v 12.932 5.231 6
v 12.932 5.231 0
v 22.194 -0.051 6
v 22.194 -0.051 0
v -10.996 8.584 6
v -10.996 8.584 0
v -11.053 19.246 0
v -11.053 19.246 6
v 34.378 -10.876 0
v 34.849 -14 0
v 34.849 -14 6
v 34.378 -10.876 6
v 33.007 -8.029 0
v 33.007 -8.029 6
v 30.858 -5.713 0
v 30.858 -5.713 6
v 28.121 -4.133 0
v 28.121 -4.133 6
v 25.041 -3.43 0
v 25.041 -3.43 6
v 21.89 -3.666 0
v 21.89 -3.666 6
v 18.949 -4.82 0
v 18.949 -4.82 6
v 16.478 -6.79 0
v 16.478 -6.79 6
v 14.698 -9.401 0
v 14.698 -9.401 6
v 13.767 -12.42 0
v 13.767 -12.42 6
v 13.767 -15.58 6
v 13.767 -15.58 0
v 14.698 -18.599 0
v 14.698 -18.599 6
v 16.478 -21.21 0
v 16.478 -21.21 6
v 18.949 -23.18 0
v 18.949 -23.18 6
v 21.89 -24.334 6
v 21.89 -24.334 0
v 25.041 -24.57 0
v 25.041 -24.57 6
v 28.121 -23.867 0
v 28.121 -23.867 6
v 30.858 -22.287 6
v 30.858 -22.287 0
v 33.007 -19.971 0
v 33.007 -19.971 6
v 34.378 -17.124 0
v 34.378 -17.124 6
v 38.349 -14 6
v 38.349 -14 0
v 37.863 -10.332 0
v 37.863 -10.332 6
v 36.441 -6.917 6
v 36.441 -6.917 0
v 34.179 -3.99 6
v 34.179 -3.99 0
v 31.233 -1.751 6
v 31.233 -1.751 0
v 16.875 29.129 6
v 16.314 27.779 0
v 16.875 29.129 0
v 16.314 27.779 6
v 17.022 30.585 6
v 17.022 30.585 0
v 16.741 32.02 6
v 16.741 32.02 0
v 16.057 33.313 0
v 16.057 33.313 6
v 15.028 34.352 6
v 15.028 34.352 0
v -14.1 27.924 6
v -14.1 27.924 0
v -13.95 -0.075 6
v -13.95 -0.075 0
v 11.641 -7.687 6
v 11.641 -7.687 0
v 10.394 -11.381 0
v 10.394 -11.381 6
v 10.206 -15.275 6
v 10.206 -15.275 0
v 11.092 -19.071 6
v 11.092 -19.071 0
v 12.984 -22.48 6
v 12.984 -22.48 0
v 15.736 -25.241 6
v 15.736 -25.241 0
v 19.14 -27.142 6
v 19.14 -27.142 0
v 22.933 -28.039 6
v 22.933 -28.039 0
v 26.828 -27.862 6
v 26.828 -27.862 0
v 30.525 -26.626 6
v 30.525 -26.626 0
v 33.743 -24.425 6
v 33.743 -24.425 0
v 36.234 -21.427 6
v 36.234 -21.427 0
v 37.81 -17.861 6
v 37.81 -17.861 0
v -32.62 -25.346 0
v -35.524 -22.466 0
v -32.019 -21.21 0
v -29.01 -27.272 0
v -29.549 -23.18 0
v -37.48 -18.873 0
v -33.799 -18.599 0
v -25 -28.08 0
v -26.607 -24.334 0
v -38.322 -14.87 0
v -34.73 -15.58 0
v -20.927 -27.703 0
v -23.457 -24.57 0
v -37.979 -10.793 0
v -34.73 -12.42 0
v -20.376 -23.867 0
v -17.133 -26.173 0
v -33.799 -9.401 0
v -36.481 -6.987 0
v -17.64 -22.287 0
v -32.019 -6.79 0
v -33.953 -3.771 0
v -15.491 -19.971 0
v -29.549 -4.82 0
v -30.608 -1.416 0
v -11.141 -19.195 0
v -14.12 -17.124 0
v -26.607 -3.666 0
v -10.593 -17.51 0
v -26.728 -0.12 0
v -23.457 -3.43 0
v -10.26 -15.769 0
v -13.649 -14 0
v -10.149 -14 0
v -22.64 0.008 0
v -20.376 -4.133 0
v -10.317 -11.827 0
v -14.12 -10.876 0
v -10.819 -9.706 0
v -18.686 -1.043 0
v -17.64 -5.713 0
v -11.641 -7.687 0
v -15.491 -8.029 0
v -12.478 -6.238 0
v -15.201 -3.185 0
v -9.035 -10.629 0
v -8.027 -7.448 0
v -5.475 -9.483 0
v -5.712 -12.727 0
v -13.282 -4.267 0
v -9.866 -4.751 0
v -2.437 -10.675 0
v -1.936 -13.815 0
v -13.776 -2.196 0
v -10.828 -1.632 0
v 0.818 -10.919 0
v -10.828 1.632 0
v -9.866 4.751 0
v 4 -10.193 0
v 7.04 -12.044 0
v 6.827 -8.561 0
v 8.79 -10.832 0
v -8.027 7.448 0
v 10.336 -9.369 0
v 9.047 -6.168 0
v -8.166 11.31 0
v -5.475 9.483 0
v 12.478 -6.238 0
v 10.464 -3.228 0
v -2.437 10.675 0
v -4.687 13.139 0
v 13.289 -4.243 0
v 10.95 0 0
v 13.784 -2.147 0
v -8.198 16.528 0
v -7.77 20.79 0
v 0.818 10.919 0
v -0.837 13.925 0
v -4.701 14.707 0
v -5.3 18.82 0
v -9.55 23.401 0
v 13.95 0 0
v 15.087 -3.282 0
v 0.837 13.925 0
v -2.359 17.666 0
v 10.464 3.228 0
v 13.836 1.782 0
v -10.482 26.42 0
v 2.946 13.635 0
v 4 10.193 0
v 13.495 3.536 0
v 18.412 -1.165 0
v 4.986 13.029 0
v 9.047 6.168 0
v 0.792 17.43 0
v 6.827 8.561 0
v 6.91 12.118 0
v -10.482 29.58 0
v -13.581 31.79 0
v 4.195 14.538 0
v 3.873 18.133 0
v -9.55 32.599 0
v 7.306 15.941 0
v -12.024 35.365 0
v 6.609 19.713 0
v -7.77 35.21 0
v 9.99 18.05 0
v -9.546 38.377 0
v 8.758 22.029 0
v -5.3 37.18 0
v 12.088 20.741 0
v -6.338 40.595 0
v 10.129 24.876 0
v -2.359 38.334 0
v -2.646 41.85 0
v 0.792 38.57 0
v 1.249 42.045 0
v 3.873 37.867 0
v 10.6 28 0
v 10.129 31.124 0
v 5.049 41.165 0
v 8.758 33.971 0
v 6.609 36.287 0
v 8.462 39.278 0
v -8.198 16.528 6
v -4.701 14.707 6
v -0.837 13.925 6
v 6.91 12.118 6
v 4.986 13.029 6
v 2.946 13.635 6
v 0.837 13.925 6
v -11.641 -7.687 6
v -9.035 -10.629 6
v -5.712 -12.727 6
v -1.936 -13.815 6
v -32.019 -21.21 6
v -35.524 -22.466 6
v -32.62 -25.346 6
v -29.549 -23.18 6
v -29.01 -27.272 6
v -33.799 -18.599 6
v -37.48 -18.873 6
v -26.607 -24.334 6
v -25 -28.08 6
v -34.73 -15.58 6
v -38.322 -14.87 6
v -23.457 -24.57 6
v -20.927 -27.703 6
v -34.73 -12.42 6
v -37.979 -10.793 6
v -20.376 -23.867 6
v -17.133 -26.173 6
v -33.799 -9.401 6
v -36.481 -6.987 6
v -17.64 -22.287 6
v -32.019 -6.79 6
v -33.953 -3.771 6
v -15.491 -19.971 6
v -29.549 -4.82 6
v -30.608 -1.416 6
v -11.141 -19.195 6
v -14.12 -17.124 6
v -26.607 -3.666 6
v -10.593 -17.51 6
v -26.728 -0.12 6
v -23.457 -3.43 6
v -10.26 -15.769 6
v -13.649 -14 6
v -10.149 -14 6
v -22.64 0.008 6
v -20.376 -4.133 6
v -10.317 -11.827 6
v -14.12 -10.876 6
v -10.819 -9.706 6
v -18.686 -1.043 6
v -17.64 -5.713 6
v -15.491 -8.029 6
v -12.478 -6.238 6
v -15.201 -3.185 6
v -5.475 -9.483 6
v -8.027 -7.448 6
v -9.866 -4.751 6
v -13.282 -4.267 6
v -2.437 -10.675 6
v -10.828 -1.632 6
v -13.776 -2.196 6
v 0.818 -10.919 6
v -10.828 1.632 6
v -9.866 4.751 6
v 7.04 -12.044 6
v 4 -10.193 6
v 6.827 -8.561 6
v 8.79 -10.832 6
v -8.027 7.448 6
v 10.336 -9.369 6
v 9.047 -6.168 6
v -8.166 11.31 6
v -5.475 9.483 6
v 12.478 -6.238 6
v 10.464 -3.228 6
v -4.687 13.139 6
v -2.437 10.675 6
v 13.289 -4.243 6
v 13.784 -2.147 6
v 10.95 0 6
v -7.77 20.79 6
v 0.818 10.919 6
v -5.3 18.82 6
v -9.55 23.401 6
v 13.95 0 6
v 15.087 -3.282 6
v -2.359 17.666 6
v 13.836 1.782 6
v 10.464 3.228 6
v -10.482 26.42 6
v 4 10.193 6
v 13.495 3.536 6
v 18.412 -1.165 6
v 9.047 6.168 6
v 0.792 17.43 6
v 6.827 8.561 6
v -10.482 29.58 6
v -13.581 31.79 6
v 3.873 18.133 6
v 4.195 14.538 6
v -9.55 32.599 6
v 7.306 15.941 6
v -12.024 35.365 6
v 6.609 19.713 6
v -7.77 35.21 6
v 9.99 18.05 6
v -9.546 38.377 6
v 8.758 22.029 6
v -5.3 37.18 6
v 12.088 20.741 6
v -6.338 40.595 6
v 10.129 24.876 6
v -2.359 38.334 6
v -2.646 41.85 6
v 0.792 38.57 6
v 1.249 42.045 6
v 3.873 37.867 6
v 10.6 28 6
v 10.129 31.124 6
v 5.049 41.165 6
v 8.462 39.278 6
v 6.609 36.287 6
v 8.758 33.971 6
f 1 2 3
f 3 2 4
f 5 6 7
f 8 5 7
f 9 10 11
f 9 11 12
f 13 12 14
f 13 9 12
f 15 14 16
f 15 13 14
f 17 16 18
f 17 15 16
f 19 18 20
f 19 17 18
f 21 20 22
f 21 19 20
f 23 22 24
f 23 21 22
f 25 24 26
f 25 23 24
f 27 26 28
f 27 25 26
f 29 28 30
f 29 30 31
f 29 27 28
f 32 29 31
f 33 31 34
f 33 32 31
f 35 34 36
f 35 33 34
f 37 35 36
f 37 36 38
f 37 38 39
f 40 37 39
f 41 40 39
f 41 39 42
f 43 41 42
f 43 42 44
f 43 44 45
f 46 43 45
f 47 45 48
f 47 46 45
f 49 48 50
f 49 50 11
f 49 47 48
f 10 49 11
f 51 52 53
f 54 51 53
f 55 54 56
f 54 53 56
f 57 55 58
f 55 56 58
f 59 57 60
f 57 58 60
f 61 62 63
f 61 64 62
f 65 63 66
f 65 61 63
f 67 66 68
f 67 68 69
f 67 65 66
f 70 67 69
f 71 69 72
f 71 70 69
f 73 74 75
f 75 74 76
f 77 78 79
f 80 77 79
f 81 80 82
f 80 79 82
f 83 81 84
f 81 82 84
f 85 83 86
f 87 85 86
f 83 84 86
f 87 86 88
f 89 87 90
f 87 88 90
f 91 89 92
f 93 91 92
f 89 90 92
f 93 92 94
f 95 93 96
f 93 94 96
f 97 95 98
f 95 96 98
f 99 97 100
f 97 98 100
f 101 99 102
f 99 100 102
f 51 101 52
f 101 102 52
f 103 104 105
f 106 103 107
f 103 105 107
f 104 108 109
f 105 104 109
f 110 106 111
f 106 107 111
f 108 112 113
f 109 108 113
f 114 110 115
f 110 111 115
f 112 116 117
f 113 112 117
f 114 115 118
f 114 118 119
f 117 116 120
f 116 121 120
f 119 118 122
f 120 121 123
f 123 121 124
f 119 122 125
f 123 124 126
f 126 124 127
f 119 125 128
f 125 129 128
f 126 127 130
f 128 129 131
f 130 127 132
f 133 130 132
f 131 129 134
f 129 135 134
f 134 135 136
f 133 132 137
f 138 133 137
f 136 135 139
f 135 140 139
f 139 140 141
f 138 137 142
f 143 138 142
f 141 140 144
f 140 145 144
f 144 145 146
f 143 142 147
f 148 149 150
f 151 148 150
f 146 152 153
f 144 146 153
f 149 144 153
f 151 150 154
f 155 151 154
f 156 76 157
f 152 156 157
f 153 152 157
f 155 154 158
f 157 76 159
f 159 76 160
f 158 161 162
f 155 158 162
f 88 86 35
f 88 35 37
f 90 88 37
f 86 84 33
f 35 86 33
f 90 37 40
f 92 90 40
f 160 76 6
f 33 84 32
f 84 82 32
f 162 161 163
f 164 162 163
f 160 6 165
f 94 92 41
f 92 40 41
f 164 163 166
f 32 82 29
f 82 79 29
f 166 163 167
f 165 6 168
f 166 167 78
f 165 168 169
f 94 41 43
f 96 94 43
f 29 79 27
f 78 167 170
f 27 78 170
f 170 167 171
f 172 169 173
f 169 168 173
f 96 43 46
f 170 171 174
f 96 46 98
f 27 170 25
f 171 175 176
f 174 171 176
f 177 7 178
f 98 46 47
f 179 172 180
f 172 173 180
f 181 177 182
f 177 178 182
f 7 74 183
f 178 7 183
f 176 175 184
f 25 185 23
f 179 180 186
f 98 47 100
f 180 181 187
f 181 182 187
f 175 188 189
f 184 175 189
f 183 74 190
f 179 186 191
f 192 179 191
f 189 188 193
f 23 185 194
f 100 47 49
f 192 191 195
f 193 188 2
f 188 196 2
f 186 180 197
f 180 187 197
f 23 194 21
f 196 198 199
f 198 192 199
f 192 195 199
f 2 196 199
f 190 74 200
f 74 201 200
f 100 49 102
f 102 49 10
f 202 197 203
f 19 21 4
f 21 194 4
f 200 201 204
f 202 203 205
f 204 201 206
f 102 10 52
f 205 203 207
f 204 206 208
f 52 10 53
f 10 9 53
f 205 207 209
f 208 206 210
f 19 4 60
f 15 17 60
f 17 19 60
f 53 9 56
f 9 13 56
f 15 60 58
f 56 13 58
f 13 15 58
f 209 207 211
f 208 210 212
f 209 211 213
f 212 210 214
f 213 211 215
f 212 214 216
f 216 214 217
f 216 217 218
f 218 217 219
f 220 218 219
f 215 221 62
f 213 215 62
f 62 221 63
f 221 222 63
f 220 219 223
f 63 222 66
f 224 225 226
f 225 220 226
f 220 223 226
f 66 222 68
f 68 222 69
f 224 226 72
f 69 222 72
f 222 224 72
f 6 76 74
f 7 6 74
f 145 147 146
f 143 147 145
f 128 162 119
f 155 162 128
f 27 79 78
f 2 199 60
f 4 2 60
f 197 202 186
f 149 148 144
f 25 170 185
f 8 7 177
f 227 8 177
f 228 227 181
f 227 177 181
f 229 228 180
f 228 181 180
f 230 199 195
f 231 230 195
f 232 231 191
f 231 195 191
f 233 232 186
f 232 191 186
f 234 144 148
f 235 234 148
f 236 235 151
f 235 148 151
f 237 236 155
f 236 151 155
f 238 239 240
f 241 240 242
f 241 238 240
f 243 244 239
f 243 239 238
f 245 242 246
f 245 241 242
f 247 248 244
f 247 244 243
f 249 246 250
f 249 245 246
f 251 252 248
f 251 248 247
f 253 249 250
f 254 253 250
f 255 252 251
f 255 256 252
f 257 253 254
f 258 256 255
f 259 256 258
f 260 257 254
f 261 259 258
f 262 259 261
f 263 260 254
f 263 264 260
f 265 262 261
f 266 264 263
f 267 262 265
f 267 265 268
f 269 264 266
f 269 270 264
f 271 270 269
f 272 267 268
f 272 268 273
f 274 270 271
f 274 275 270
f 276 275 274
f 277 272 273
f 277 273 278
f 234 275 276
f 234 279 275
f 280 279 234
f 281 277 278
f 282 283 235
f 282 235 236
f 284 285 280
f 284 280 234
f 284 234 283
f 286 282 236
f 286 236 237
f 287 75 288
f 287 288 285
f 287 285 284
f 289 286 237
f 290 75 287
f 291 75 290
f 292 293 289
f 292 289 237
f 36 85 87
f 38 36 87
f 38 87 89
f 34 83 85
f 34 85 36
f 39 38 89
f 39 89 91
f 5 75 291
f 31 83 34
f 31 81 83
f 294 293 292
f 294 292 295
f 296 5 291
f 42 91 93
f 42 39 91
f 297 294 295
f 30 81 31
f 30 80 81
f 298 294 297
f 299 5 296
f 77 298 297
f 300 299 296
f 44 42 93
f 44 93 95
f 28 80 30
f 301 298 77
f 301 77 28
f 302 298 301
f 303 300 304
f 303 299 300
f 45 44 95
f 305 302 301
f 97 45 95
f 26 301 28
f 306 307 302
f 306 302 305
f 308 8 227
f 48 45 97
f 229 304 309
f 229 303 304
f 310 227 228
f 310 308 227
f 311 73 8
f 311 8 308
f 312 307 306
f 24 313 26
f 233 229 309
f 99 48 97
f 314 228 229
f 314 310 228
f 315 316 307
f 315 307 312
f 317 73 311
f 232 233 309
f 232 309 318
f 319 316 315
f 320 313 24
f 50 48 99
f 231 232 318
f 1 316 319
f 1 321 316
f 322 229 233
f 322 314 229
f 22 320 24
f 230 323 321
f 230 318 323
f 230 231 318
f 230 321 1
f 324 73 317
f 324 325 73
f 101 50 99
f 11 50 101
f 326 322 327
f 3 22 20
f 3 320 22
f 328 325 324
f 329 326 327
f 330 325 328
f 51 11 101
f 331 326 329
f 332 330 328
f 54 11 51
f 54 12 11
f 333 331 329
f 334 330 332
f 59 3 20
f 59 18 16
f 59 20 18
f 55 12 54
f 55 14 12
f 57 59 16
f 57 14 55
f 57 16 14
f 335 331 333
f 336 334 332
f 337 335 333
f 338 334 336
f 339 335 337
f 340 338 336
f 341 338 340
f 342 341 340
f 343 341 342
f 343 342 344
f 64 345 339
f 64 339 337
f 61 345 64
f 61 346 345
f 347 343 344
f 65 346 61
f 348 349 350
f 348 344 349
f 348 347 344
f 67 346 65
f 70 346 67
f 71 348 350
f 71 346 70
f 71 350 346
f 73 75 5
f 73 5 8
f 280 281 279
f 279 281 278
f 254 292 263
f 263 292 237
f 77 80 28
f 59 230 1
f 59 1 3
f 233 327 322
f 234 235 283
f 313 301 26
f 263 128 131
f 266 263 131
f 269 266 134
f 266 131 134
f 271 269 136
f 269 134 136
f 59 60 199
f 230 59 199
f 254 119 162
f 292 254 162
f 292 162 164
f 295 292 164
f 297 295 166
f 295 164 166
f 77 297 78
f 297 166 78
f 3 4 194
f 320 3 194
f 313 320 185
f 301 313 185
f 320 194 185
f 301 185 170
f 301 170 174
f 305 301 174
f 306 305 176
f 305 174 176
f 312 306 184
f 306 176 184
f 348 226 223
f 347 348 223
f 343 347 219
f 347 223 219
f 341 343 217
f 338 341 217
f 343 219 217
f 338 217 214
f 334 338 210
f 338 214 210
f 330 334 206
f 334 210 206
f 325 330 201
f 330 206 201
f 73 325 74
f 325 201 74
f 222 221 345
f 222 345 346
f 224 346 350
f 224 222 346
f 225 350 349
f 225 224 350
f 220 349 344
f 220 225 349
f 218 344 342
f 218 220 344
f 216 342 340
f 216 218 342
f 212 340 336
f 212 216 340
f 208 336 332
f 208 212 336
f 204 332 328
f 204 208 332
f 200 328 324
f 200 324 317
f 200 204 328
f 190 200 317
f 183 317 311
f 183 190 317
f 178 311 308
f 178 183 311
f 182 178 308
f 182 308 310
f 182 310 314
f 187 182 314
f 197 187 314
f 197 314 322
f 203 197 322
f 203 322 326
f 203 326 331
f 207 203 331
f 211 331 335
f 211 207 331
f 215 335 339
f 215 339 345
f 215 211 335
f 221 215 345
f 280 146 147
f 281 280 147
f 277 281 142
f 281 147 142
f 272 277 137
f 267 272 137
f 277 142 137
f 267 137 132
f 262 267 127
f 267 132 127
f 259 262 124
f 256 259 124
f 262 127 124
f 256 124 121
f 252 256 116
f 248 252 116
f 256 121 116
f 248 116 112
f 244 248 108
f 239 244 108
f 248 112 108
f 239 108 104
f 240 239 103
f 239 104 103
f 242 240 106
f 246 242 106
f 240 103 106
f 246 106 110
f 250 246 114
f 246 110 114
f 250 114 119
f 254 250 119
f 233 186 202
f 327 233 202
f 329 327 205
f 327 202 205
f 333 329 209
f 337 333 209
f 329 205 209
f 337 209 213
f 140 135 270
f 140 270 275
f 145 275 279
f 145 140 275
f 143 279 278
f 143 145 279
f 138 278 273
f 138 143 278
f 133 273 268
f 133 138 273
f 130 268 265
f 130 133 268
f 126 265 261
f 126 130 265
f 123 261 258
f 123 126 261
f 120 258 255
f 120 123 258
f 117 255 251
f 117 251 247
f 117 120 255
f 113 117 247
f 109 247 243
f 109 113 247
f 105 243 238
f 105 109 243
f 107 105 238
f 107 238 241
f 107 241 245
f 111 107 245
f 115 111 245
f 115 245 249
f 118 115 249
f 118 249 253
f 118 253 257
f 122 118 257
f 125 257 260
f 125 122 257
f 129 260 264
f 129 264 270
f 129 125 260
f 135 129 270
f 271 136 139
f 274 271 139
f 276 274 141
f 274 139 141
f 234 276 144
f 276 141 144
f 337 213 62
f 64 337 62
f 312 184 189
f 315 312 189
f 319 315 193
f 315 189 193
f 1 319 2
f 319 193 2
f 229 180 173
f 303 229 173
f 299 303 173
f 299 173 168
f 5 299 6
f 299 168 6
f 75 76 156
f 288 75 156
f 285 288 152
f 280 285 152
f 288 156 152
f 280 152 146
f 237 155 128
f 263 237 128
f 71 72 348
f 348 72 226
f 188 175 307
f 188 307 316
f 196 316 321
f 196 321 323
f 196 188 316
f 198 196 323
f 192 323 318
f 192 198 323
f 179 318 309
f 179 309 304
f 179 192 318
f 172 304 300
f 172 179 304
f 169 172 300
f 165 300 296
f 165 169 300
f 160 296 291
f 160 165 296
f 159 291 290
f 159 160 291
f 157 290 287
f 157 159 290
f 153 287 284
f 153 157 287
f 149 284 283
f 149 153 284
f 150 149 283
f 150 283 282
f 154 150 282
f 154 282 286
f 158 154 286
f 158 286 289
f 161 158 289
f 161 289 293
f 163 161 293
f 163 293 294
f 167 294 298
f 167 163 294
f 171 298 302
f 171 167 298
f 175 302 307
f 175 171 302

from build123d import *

# Parameters (mm, degrees)
F0_R     = 10.95
F0_R_2   = 10.6
F1_DEPTH = 6
F2_R     = 5


with BuildPart() as f1:
    # F0 (on Top) → F1 (new body)
    with BuildSketch(Plane.XY):
        with BuildLine():
            ThreePointArc((12.4777984827, -6.2375512043), (13.5769618994, -3.2044665053), (13.95, 0))
            ThreePointArc((13.95, 0), (13.6931728351, 2.6644920167), (12.932147999, 5.2308745094))
            ThreePointArc((12.932147999, 5.2308745094), (10.5018317529, 9.1822671401), (6.9101799774, 12.118247096))
            ThreePointArc((6.9101799774, 12.118247096), (3.977530702, 13.3709292689), (0.8370214411, 13.9248660714))
            ThreePointArc((0.8370214411, 13.9248660714), (0, 13.9), (-0.8370214411, 13.9248660714))
            ThreePointArc((-0.8370214411, 13.9248660714), (-6.4912873033, 12.3476997512), (-10.9961438792, 8.5841318599))
            ThreePointArc((-10.9961438792, 8.5841318599), (-13.2029923977, 4.5037197676), (-13.9497998232, -0.0747321429))
            ThreePointArc((-13.9497998232, -0.0747321429), (-13.5683297701, -3.2408220022), (-12.4777984827, -6.2375512043))
            ThreePointArc((-12.4777984827, -6.2375512043), (-12.0377531126, -6.95), (-11.6407770416, -7.6873148672))
            ThreePointArc((-11.6407770416, -7.6873148672), (-7.4477777849, -11.7954697264), (-1.9360037904, -13.8150059473))
            ThreePointArc((-1.9360037904, -13.8150059473), (2.7011607312, -13.6859866544), (7.0396198458, -12.0435149532))
            ThreePointArc((7.0396198458, -12.0435149532), (9.5907990681, -10.1301072667), (11.6407770416, -7.6873148672))
            ThreePointArc((11.6407770416, -7.6873148672), (12.0377531126, -6.95), (12.4777984827, -6.2375512043))
        make_face()
        Circle(F0_R, mode=Mode.SUBTRACT)
        with BuildLine():
            ThreePointArc((6.9101799774, 12.118247096), (10.5018317529, 9.1822671401), (12.932147999, 5.2308745094))
            Line((12.932147999, 5.2308745094), (22.1940121838, -0.0505121414))
            ThreePointArc((22.1940121838, -0.0505121414), (26.8561983982, -0.1431962176), (31.2331942939, -1.7514491718))
            Line((31.2331942939, -1.7514491718), (6.9101799774, 12.118247096))
        make_face()
        with BuildLine():
            ThreePointArc((22.1940121838, -0.0505121414), (16.67528741, -2.1065879373), (12.4777984827, -6.2375512043))
            ThreePointArc((12.4777984827, -6.2375512043), (12.0810543828, -6.975), (11.6407770416, -7.6873148672))
            ThreePointArc((11.6407770416, -7.6873148672), (21.0054007386, -27.7219144642), (38.348711306, -14))
            ThreePointArc((38.348711306, -14), (36.4407416974, -6.9173172501), (31.2331942939, -1.7514491718))
            ThreePointArc((31.2331942939, -1.7514491718), (26.8561983982, -0.1431962176), (22.1940121838, -0.0505121414))
        make_face()
        with Locations((24.248711306, -14)):
            Circle(F0_R_2, mode=Mode.SUBTRACT)
        with BuildLine():
            ThreePointArc((11.6407770416, -7.6873148672), (12.0810543828, -6.975), (12.4777984827, -6.2375512043))
            ThreePointArc((12.4777984827, -6.2375512043), (12.0377531126, -6.95), (11.6407770416, -7.6873148672))
        make_face()
        with BuildLine():
            ThreePointArc((-0.8370214411, 13.9248660714), (0, 13.9), (0.8370214411, 13.9248660714))
            ThreePointArc((0.8370214411, 13.9248660714), (0, 13.95), (-0.8370214411, 13.9248660714))
        make_face()
        with BuildLine():
            ThreePointArc((-0.8370214411, 13.9248660714), (0, 13.95), (0.8370214411, 13.9248660714))
            ThreePointArc((0.8370214411, 13.9248660714), (7.3062558034, 15.940620823), (12.0881437953, 20.7414340546))
            ThreePointArc((12.0881437953, 20.7414340546), (13.5877302651, 24.2338897729), (14.1, 28))
            ThreePointArc((14.1, 28), (12.6120042357, 34.3045498776), (8.4620781334, 39.2784411008))
            ThreePointArc((8.4620781334, 39.2784411008), (-6.338309536, 40.5950717436), (-14.0997976707, 27.9244642857))
            ThreePointArc((-14.0997976707, 27.9244642857), (-13.3040875478, 23.329747917), (-11.0532609603, 19.2458340121))
            ThreePointArc((-11.0532609603, 19.2458340121), (-6.5132847974, 15.4945163569), (-0.8370214411, 13.9248660714))
        make_face()
        with Locations((0, 28)):
            Circle(F0_R_2, mode=Mode.SUBTRACT)
        with BuildLine():
            Line((-17.1333966231, -26.1730151139), (7.0396198458, -12.0435149532))
            ThreePointArc((7.0396198458, -12.0435149532), (2.7011607312, -13.6859866544), (-1.9360037904, -13.8150059473))
            Line((-1.9360037904, -13.8150059473), (-11.1407508896, -19.1953222924))
            ThreePointArc((-11.1407508896, -19.1953222924), (-13.5521107613, -23.1865519531), (-17.1333966231, -26.1730151139))
        make_face()
        with BuildLine():
            ThreePointArc((14.1, 28), (13.5877302651, 24.2338897729), (12.0881437953, 20.7414340546))
            Line((12.0881437953, 20.7414340546), (18.6356199511, 31.6453555542))
            Line((18.6356199511, 31.6453555542), (8.4620781334, 39.2784411008))
            ThreePointArc((8.4620781334, 39.2784411008), (12.6120042357, 34.3045498776), (14.1, 28))
        make_face()
        with BuildLine():
            ThreePointArc((-12.4777984827, -6.2375512043), (-37.9792640143, -10.7934563276), (-17.1333966231, -26.1730151139))
            ThreePointArc((-17.1333966231, -26.1730151139), (-13.5521107613, -23.1865519531), (-11.1407508896, -19.1953222924))
            ThreePointArc((-11.1407508896, -19.1953222924), (-10.398941599, -16.64459431), (-10.148711306, -14))
            ThreePointArc((-10.148711306, -14), (-10.5267968417, -10.7566894326), (-11.6407770416, -7.6873148672))
            ThreePointArc((-11.6407770416, -7.6873148672), (-12.0810543828, -6.975), (-12.4777984827, -6.2375512043))
        make_face()
        with Locations((-24.248711306, -14)):
            Circle(F0_R_2, mode=Mode.SUBTRACT)
        with BuildLine():
            ThreePointArc((-13.9497998232, -0.0747321429), (-13.2029923977, 4.5037197676), (-10.9961438792, 8.5841318599))
            Line((-10.9961438792, 8.5841318599), (-11.0532609603, 19.2458340121))
            ThreePointArc((-11.0532609603, 19.2458340121), (-13.3040875478, 23.329747917), (-14.0997976707, 27.9244642857))
            Line((-14.0997976707, 27.9244642857), (-13.9497998232, -0.0747321429))
        make_face()
        with BuildLine():
            ThreePointArc((-12.4777984827, -6.2375512043), (-12.0810543828, -6.975), (-11.6407770416, -7.6873148672))
            ThreePointArc((-11.6407770416, -7.6873148672), (-12.0377531126, -6.95), (-12.4777984827, -6.2375512043))
        make_face()
    extrude(amount=F1_DEPTH)

    # F2
    f2_edges = [f1.edges().sort_by_distance(p)[0] for p in [
        (18.63562, 31.645356, 3),
    ]]
    fillet(f2_edges, radius=F2_R)


solid = f1.part
